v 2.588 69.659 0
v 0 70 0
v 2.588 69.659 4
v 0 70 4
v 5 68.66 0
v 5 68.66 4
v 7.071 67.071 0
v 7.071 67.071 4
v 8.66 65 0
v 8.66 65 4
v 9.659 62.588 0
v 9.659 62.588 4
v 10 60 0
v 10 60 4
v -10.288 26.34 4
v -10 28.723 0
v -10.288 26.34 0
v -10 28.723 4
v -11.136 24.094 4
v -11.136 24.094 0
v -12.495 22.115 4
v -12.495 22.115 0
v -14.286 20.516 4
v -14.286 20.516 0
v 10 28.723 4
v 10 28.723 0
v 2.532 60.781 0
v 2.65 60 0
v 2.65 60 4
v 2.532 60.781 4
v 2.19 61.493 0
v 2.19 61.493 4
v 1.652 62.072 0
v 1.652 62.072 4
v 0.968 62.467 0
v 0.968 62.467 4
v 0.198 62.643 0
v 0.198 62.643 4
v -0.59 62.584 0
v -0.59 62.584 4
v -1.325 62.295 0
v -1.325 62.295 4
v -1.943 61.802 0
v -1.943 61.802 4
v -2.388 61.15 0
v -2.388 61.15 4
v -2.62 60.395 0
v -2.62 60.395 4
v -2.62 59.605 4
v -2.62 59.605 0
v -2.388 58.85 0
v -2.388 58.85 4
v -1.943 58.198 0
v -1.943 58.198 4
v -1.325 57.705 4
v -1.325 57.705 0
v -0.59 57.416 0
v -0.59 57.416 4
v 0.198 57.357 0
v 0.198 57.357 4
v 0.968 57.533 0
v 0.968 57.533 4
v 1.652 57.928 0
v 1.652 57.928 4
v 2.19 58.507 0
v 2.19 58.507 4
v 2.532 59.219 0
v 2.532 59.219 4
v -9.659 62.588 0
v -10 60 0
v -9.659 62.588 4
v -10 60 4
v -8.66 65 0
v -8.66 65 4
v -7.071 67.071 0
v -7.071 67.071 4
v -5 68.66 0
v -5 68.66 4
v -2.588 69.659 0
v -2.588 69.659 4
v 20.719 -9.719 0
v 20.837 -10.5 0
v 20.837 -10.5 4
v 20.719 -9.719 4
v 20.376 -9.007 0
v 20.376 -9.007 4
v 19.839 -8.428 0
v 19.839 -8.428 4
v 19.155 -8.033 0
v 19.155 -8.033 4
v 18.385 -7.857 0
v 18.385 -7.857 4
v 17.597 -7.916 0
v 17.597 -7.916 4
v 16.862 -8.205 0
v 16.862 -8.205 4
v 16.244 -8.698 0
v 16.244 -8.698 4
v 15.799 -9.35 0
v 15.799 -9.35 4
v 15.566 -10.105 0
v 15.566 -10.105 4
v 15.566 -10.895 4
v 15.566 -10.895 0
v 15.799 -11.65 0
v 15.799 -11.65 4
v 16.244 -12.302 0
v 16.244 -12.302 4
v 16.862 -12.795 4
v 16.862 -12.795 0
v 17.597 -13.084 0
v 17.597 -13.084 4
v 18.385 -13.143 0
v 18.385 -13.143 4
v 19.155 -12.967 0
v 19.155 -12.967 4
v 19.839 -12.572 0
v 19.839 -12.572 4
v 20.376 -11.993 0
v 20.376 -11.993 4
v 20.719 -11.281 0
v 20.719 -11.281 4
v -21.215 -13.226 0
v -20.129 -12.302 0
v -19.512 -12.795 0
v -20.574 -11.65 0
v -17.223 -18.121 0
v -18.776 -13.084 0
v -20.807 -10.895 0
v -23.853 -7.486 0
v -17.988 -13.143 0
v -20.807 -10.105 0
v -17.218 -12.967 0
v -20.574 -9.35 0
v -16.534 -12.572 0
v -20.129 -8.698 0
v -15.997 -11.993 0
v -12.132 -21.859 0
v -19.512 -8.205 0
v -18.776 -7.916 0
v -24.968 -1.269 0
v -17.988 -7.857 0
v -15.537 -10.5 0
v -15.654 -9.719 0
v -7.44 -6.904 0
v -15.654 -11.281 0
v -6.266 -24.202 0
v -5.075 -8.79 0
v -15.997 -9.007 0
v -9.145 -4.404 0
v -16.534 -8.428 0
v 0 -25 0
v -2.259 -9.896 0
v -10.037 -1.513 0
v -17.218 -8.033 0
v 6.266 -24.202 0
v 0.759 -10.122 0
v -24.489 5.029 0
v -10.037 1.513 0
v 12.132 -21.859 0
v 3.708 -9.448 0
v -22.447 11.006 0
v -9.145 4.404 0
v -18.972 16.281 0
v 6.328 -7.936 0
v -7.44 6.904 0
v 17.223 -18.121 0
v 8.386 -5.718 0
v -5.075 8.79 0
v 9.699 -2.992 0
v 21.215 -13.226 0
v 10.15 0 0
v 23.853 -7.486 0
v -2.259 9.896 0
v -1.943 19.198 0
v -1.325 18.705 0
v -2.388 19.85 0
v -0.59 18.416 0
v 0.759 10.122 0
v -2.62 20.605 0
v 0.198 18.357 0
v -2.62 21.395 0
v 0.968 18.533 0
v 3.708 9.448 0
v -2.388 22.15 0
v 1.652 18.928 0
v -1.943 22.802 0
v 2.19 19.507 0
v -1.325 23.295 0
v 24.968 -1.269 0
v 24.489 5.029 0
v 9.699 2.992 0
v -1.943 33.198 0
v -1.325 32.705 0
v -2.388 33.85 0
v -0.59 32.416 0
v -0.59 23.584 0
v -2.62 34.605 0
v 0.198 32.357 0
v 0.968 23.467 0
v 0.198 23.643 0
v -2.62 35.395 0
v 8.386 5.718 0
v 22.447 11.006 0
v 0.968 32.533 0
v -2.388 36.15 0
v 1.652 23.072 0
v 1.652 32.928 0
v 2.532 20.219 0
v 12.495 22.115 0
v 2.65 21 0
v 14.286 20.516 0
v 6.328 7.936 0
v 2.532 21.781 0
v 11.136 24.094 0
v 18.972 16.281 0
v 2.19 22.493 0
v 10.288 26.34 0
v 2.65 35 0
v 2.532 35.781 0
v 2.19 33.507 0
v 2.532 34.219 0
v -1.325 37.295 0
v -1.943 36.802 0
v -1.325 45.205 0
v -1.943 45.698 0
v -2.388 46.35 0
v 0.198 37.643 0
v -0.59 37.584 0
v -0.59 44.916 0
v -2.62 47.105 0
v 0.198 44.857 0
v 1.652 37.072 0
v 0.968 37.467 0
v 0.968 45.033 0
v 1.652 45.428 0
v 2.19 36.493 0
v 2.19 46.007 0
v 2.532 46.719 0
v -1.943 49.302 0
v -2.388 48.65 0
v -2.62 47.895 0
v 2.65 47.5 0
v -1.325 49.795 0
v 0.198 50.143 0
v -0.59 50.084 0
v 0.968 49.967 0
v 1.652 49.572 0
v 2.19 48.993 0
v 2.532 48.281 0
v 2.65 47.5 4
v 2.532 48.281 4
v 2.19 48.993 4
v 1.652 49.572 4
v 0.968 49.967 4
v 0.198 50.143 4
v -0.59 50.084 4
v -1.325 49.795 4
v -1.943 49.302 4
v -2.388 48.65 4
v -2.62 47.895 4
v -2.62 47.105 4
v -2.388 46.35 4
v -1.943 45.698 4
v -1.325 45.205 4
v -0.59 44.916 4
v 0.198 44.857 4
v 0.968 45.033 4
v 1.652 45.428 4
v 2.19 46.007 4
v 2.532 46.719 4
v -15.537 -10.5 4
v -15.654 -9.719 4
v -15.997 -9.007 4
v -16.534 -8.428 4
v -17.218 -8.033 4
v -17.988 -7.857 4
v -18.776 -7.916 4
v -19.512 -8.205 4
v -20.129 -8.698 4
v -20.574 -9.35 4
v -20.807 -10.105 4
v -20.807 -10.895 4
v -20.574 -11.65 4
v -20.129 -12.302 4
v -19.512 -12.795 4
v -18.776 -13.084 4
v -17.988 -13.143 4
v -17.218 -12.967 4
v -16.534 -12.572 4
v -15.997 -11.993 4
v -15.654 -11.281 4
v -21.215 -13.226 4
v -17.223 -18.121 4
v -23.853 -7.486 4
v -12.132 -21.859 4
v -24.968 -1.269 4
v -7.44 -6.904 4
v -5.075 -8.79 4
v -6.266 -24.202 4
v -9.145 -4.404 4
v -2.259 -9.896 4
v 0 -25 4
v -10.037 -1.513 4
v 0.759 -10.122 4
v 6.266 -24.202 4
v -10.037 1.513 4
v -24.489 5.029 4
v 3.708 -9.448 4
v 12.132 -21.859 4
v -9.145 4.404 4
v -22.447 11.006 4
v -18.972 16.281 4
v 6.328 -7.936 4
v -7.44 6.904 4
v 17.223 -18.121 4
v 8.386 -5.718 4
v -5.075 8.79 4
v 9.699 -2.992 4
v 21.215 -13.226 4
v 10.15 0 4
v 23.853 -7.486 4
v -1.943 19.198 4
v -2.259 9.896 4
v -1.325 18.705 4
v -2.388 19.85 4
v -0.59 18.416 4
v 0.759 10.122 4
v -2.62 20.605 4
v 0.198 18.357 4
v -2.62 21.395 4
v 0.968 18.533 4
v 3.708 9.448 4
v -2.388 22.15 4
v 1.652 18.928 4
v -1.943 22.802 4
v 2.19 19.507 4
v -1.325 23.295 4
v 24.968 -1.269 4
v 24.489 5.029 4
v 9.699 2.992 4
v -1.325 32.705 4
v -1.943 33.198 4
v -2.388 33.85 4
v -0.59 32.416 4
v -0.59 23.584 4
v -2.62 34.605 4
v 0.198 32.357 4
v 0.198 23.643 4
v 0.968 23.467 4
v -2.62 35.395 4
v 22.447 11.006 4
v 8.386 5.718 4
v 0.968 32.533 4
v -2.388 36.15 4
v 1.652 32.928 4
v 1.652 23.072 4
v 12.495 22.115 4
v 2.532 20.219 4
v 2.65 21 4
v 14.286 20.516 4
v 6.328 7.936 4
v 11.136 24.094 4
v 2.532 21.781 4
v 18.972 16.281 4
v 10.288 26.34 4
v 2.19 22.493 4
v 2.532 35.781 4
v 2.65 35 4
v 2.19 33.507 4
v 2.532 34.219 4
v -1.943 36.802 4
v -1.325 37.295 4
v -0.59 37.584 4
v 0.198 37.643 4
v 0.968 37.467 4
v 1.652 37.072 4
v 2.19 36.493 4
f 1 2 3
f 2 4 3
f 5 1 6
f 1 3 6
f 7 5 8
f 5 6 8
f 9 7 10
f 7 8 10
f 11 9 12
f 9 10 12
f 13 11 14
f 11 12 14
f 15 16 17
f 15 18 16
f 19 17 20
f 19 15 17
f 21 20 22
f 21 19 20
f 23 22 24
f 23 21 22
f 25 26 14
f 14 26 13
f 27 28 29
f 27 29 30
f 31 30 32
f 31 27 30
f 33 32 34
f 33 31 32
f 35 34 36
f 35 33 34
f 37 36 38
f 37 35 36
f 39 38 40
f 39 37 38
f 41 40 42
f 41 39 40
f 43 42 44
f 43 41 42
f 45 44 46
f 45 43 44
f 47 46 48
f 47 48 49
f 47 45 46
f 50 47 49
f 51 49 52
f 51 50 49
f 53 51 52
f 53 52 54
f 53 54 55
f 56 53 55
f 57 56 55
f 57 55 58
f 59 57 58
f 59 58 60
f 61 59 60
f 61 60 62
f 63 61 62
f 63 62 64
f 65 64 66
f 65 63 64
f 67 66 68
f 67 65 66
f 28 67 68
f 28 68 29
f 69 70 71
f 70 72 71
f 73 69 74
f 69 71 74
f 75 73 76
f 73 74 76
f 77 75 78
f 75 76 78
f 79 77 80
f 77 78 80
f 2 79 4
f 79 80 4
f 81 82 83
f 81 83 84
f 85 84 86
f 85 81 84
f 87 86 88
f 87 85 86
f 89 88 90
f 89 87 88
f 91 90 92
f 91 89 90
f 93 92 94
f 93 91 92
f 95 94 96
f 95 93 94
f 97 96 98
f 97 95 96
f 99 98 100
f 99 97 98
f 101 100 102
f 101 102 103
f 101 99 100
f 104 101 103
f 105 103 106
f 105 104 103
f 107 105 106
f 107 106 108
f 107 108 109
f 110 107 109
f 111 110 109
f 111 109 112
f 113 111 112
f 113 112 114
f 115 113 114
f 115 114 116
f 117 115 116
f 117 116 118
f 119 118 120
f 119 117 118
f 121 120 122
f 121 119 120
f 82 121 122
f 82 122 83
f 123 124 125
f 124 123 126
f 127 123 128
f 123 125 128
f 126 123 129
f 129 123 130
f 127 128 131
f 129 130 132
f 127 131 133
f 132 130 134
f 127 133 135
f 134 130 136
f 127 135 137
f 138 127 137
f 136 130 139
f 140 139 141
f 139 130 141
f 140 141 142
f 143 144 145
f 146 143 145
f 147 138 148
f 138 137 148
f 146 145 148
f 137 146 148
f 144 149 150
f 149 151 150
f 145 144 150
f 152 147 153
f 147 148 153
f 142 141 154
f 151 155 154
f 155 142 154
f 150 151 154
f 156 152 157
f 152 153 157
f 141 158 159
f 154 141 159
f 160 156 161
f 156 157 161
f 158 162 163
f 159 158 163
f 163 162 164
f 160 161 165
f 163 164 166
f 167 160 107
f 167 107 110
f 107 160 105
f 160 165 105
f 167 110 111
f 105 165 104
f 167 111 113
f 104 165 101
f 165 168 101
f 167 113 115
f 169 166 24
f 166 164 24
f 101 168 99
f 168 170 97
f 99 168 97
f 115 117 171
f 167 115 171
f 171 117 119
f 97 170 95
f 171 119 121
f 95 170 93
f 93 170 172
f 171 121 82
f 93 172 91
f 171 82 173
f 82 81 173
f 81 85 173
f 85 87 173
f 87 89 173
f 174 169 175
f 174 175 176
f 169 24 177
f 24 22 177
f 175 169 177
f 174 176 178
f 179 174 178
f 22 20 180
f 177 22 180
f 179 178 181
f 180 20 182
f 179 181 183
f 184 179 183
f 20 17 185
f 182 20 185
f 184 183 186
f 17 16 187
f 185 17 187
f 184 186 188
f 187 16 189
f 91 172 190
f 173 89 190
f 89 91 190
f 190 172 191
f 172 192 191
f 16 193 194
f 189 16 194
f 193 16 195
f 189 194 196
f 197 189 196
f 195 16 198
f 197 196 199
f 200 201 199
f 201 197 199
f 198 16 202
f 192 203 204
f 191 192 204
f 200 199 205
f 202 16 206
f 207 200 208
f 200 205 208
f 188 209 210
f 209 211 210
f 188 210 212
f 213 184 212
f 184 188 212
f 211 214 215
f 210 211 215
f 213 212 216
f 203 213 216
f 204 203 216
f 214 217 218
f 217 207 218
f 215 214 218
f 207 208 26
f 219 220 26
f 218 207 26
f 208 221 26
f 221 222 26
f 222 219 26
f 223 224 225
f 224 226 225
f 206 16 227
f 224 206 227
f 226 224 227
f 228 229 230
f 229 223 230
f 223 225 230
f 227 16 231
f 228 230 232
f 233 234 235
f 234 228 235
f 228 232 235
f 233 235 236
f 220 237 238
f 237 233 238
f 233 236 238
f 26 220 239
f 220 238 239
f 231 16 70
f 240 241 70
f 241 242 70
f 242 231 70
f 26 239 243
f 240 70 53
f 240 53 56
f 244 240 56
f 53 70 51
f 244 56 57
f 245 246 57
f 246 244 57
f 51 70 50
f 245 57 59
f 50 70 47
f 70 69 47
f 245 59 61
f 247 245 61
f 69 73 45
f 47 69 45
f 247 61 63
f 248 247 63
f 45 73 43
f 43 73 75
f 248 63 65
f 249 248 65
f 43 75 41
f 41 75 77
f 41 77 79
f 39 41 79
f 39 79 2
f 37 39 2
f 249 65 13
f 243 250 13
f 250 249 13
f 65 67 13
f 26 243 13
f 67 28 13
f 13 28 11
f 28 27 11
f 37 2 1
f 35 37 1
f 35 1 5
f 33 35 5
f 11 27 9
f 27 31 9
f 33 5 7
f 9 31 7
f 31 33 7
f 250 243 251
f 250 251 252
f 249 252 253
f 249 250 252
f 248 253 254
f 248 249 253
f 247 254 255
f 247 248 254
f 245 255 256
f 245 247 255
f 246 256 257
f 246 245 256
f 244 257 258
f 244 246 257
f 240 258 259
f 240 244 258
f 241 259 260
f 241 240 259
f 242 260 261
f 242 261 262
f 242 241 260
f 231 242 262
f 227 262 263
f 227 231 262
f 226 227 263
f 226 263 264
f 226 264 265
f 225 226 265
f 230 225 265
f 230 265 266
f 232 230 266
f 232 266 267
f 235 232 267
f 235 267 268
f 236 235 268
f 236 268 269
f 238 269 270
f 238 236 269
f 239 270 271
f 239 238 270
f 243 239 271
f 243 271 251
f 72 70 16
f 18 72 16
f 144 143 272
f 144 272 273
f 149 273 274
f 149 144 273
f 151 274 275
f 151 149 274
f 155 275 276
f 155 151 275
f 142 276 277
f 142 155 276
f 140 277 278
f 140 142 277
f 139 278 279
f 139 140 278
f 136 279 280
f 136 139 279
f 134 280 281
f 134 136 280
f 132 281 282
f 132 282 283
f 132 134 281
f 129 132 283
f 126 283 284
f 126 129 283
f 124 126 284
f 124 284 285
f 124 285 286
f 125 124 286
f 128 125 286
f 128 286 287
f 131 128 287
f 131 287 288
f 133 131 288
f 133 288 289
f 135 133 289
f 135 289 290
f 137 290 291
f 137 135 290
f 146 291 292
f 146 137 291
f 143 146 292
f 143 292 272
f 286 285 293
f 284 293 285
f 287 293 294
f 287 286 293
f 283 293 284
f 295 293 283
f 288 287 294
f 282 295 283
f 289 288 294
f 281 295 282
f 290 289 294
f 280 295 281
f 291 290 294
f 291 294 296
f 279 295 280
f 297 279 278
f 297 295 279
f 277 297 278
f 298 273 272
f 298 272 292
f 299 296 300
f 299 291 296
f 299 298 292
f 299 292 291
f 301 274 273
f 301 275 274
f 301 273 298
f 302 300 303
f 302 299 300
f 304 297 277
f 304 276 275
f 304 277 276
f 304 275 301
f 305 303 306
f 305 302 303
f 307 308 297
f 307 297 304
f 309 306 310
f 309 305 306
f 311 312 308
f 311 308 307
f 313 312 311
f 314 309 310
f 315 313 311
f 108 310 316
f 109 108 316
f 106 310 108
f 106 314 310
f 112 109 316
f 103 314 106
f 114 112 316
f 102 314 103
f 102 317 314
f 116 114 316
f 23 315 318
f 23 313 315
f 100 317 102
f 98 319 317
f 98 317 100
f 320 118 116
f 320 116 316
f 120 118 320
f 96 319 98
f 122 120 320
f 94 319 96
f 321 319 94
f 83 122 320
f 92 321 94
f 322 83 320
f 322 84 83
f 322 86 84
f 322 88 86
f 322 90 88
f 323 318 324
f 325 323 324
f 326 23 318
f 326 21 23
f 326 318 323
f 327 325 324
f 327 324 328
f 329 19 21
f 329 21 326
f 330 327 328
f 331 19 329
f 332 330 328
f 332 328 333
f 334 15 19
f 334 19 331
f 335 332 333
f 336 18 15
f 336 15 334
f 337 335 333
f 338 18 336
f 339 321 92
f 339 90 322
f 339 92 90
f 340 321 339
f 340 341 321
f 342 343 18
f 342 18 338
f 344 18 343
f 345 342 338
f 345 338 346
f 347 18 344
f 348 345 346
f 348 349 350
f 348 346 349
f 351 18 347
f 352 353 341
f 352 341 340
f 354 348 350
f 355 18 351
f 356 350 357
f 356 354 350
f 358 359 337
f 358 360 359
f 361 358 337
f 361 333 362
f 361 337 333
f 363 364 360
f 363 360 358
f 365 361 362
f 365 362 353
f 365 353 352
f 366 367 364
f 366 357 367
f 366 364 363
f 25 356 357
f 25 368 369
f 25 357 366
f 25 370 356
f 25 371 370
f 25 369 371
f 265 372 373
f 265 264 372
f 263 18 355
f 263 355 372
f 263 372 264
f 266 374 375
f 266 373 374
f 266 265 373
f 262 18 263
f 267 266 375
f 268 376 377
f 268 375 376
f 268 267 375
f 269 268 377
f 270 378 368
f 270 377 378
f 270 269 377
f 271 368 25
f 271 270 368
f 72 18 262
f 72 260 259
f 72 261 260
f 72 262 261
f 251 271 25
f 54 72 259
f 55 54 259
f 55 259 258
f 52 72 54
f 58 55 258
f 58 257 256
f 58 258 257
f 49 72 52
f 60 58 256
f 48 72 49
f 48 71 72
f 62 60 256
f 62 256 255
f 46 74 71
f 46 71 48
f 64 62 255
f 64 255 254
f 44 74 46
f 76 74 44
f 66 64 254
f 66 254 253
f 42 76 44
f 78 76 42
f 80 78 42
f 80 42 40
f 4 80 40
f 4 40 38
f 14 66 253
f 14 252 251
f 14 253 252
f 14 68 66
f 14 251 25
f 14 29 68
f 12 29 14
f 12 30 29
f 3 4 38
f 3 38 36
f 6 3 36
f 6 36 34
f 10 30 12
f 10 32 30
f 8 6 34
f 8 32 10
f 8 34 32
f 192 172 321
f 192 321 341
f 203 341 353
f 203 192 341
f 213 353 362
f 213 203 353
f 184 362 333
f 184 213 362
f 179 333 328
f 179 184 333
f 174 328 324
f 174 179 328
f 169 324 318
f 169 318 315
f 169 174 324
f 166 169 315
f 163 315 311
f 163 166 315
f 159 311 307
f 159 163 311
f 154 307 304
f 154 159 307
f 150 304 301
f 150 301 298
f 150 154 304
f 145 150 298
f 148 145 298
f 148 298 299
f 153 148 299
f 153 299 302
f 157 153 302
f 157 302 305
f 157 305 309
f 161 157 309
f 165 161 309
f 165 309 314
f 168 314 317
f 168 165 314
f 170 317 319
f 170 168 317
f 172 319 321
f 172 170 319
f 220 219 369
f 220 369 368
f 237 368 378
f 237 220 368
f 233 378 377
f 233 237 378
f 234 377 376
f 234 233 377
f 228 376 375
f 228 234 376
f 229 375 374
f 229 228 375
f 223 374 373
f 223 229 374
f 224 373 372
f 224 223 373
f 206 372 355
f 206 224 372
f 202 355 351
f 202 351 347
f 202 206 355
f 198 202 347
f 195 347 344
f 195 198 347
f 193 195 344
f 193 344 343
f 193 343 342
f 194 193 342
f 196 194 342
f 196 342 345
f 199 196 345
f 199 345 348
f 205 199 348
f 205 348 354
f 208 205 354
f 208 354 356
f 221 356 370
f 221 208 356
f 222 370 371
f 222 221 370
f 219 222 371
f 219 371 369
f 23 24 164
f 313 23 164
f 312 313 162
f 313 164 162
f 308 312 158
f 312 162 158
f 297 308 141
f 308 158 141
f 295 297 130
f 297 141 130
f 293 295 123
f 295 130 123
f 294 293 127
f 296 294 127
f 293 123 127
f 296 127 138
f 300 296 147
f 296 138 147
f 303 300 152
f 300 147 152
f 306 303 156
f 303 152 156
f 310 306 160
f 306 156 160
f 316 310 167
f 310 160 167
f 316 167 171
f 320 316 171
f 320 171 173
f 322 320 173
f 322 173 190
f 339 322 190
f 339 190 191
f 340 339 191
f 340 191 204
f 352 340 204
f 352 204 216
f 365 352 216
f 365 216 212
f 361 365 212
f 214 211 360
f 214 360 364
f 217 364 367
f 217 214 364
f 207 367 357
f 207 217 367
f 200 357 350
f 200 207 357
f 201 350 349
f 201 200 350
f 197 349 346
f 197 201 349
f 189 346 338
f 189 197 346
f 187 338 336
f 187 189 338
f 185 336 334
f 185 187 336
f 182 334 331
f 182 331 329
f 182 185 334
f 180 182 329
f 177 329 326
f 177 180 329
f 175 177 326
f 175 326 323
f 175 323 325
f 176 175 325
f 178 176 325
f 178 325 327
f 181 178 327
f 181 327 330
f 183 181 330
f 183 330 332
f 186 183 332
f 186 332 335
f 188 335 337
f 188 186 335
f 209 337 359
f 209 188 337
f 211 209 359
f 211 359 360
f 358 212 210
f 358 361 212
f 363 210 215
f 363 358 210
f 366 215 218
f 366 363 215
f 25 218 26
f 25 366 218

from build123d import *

# Parameters (mm, degrees)
SKETCH_1_R      = 10.15
SKETCH_1_R_2    = 2.65
EXTRUDE_1_DEPTH = 4
FILLET_1_R      = 10


with BuildPart() as part:
    # 草图1 → 凸台-拉伸1 (new body)
    with BuildSketch(Plane.XY):
        with BuildLine():
            Line((-10, 70), (-10, 22.912878475))
            ThreePointArc((-10, 22.912878475), (0, -25), (10, 22.912878475))
            Line((10, 22.912878475), (10, 70))
            Line((10, 70), (-10, 70))
        make_face()
        Circle(SKETCH_1_R, mode=Mode.SUBTRACT)
        with Locations((0, 21)):
            Circle(SKETCH_1_R_2, mode=Mode.SUBTRACT)
        with Locations((18.186533479, -10.5)):
            Circle(SKETCH_1_R_2, mode=Mode.SUBTRACT)
        with Locations((-18.186533479, -10.5)):
            Circle(SKETCH_1_R_2, mode=Mode.SUBTRACT)
        with Locations((0, 60)):
            Circle(SKETCH_1_R_2, mode=Mode.SUBTRACT)
        with Locations((0, 35)):
            Circle(SKETCH_1_R_2, mode=Mode.SUBTRACT)
        with Locations((0, 47.5)):
            Circle(SKETCH_1_R_2, mode=Mode.SUBTRACT)
    extrude(amount=EXTRUDE_1_DEPTH)

    # 圆角1
    fillet_1_edges = [part.edges().sort_by_distance(p)[0] for p in [
        (10, 22.912878475, 2),
        (10, 70, 2),
        (-10, 70, 2),
        (-10, 22.912878475, 2),
    ]]
    fillet(fillet_1_edges, radius=FILLET_1_R - 0.0001)  # a hair under: the kernel refuses the full size


solid = part.part
